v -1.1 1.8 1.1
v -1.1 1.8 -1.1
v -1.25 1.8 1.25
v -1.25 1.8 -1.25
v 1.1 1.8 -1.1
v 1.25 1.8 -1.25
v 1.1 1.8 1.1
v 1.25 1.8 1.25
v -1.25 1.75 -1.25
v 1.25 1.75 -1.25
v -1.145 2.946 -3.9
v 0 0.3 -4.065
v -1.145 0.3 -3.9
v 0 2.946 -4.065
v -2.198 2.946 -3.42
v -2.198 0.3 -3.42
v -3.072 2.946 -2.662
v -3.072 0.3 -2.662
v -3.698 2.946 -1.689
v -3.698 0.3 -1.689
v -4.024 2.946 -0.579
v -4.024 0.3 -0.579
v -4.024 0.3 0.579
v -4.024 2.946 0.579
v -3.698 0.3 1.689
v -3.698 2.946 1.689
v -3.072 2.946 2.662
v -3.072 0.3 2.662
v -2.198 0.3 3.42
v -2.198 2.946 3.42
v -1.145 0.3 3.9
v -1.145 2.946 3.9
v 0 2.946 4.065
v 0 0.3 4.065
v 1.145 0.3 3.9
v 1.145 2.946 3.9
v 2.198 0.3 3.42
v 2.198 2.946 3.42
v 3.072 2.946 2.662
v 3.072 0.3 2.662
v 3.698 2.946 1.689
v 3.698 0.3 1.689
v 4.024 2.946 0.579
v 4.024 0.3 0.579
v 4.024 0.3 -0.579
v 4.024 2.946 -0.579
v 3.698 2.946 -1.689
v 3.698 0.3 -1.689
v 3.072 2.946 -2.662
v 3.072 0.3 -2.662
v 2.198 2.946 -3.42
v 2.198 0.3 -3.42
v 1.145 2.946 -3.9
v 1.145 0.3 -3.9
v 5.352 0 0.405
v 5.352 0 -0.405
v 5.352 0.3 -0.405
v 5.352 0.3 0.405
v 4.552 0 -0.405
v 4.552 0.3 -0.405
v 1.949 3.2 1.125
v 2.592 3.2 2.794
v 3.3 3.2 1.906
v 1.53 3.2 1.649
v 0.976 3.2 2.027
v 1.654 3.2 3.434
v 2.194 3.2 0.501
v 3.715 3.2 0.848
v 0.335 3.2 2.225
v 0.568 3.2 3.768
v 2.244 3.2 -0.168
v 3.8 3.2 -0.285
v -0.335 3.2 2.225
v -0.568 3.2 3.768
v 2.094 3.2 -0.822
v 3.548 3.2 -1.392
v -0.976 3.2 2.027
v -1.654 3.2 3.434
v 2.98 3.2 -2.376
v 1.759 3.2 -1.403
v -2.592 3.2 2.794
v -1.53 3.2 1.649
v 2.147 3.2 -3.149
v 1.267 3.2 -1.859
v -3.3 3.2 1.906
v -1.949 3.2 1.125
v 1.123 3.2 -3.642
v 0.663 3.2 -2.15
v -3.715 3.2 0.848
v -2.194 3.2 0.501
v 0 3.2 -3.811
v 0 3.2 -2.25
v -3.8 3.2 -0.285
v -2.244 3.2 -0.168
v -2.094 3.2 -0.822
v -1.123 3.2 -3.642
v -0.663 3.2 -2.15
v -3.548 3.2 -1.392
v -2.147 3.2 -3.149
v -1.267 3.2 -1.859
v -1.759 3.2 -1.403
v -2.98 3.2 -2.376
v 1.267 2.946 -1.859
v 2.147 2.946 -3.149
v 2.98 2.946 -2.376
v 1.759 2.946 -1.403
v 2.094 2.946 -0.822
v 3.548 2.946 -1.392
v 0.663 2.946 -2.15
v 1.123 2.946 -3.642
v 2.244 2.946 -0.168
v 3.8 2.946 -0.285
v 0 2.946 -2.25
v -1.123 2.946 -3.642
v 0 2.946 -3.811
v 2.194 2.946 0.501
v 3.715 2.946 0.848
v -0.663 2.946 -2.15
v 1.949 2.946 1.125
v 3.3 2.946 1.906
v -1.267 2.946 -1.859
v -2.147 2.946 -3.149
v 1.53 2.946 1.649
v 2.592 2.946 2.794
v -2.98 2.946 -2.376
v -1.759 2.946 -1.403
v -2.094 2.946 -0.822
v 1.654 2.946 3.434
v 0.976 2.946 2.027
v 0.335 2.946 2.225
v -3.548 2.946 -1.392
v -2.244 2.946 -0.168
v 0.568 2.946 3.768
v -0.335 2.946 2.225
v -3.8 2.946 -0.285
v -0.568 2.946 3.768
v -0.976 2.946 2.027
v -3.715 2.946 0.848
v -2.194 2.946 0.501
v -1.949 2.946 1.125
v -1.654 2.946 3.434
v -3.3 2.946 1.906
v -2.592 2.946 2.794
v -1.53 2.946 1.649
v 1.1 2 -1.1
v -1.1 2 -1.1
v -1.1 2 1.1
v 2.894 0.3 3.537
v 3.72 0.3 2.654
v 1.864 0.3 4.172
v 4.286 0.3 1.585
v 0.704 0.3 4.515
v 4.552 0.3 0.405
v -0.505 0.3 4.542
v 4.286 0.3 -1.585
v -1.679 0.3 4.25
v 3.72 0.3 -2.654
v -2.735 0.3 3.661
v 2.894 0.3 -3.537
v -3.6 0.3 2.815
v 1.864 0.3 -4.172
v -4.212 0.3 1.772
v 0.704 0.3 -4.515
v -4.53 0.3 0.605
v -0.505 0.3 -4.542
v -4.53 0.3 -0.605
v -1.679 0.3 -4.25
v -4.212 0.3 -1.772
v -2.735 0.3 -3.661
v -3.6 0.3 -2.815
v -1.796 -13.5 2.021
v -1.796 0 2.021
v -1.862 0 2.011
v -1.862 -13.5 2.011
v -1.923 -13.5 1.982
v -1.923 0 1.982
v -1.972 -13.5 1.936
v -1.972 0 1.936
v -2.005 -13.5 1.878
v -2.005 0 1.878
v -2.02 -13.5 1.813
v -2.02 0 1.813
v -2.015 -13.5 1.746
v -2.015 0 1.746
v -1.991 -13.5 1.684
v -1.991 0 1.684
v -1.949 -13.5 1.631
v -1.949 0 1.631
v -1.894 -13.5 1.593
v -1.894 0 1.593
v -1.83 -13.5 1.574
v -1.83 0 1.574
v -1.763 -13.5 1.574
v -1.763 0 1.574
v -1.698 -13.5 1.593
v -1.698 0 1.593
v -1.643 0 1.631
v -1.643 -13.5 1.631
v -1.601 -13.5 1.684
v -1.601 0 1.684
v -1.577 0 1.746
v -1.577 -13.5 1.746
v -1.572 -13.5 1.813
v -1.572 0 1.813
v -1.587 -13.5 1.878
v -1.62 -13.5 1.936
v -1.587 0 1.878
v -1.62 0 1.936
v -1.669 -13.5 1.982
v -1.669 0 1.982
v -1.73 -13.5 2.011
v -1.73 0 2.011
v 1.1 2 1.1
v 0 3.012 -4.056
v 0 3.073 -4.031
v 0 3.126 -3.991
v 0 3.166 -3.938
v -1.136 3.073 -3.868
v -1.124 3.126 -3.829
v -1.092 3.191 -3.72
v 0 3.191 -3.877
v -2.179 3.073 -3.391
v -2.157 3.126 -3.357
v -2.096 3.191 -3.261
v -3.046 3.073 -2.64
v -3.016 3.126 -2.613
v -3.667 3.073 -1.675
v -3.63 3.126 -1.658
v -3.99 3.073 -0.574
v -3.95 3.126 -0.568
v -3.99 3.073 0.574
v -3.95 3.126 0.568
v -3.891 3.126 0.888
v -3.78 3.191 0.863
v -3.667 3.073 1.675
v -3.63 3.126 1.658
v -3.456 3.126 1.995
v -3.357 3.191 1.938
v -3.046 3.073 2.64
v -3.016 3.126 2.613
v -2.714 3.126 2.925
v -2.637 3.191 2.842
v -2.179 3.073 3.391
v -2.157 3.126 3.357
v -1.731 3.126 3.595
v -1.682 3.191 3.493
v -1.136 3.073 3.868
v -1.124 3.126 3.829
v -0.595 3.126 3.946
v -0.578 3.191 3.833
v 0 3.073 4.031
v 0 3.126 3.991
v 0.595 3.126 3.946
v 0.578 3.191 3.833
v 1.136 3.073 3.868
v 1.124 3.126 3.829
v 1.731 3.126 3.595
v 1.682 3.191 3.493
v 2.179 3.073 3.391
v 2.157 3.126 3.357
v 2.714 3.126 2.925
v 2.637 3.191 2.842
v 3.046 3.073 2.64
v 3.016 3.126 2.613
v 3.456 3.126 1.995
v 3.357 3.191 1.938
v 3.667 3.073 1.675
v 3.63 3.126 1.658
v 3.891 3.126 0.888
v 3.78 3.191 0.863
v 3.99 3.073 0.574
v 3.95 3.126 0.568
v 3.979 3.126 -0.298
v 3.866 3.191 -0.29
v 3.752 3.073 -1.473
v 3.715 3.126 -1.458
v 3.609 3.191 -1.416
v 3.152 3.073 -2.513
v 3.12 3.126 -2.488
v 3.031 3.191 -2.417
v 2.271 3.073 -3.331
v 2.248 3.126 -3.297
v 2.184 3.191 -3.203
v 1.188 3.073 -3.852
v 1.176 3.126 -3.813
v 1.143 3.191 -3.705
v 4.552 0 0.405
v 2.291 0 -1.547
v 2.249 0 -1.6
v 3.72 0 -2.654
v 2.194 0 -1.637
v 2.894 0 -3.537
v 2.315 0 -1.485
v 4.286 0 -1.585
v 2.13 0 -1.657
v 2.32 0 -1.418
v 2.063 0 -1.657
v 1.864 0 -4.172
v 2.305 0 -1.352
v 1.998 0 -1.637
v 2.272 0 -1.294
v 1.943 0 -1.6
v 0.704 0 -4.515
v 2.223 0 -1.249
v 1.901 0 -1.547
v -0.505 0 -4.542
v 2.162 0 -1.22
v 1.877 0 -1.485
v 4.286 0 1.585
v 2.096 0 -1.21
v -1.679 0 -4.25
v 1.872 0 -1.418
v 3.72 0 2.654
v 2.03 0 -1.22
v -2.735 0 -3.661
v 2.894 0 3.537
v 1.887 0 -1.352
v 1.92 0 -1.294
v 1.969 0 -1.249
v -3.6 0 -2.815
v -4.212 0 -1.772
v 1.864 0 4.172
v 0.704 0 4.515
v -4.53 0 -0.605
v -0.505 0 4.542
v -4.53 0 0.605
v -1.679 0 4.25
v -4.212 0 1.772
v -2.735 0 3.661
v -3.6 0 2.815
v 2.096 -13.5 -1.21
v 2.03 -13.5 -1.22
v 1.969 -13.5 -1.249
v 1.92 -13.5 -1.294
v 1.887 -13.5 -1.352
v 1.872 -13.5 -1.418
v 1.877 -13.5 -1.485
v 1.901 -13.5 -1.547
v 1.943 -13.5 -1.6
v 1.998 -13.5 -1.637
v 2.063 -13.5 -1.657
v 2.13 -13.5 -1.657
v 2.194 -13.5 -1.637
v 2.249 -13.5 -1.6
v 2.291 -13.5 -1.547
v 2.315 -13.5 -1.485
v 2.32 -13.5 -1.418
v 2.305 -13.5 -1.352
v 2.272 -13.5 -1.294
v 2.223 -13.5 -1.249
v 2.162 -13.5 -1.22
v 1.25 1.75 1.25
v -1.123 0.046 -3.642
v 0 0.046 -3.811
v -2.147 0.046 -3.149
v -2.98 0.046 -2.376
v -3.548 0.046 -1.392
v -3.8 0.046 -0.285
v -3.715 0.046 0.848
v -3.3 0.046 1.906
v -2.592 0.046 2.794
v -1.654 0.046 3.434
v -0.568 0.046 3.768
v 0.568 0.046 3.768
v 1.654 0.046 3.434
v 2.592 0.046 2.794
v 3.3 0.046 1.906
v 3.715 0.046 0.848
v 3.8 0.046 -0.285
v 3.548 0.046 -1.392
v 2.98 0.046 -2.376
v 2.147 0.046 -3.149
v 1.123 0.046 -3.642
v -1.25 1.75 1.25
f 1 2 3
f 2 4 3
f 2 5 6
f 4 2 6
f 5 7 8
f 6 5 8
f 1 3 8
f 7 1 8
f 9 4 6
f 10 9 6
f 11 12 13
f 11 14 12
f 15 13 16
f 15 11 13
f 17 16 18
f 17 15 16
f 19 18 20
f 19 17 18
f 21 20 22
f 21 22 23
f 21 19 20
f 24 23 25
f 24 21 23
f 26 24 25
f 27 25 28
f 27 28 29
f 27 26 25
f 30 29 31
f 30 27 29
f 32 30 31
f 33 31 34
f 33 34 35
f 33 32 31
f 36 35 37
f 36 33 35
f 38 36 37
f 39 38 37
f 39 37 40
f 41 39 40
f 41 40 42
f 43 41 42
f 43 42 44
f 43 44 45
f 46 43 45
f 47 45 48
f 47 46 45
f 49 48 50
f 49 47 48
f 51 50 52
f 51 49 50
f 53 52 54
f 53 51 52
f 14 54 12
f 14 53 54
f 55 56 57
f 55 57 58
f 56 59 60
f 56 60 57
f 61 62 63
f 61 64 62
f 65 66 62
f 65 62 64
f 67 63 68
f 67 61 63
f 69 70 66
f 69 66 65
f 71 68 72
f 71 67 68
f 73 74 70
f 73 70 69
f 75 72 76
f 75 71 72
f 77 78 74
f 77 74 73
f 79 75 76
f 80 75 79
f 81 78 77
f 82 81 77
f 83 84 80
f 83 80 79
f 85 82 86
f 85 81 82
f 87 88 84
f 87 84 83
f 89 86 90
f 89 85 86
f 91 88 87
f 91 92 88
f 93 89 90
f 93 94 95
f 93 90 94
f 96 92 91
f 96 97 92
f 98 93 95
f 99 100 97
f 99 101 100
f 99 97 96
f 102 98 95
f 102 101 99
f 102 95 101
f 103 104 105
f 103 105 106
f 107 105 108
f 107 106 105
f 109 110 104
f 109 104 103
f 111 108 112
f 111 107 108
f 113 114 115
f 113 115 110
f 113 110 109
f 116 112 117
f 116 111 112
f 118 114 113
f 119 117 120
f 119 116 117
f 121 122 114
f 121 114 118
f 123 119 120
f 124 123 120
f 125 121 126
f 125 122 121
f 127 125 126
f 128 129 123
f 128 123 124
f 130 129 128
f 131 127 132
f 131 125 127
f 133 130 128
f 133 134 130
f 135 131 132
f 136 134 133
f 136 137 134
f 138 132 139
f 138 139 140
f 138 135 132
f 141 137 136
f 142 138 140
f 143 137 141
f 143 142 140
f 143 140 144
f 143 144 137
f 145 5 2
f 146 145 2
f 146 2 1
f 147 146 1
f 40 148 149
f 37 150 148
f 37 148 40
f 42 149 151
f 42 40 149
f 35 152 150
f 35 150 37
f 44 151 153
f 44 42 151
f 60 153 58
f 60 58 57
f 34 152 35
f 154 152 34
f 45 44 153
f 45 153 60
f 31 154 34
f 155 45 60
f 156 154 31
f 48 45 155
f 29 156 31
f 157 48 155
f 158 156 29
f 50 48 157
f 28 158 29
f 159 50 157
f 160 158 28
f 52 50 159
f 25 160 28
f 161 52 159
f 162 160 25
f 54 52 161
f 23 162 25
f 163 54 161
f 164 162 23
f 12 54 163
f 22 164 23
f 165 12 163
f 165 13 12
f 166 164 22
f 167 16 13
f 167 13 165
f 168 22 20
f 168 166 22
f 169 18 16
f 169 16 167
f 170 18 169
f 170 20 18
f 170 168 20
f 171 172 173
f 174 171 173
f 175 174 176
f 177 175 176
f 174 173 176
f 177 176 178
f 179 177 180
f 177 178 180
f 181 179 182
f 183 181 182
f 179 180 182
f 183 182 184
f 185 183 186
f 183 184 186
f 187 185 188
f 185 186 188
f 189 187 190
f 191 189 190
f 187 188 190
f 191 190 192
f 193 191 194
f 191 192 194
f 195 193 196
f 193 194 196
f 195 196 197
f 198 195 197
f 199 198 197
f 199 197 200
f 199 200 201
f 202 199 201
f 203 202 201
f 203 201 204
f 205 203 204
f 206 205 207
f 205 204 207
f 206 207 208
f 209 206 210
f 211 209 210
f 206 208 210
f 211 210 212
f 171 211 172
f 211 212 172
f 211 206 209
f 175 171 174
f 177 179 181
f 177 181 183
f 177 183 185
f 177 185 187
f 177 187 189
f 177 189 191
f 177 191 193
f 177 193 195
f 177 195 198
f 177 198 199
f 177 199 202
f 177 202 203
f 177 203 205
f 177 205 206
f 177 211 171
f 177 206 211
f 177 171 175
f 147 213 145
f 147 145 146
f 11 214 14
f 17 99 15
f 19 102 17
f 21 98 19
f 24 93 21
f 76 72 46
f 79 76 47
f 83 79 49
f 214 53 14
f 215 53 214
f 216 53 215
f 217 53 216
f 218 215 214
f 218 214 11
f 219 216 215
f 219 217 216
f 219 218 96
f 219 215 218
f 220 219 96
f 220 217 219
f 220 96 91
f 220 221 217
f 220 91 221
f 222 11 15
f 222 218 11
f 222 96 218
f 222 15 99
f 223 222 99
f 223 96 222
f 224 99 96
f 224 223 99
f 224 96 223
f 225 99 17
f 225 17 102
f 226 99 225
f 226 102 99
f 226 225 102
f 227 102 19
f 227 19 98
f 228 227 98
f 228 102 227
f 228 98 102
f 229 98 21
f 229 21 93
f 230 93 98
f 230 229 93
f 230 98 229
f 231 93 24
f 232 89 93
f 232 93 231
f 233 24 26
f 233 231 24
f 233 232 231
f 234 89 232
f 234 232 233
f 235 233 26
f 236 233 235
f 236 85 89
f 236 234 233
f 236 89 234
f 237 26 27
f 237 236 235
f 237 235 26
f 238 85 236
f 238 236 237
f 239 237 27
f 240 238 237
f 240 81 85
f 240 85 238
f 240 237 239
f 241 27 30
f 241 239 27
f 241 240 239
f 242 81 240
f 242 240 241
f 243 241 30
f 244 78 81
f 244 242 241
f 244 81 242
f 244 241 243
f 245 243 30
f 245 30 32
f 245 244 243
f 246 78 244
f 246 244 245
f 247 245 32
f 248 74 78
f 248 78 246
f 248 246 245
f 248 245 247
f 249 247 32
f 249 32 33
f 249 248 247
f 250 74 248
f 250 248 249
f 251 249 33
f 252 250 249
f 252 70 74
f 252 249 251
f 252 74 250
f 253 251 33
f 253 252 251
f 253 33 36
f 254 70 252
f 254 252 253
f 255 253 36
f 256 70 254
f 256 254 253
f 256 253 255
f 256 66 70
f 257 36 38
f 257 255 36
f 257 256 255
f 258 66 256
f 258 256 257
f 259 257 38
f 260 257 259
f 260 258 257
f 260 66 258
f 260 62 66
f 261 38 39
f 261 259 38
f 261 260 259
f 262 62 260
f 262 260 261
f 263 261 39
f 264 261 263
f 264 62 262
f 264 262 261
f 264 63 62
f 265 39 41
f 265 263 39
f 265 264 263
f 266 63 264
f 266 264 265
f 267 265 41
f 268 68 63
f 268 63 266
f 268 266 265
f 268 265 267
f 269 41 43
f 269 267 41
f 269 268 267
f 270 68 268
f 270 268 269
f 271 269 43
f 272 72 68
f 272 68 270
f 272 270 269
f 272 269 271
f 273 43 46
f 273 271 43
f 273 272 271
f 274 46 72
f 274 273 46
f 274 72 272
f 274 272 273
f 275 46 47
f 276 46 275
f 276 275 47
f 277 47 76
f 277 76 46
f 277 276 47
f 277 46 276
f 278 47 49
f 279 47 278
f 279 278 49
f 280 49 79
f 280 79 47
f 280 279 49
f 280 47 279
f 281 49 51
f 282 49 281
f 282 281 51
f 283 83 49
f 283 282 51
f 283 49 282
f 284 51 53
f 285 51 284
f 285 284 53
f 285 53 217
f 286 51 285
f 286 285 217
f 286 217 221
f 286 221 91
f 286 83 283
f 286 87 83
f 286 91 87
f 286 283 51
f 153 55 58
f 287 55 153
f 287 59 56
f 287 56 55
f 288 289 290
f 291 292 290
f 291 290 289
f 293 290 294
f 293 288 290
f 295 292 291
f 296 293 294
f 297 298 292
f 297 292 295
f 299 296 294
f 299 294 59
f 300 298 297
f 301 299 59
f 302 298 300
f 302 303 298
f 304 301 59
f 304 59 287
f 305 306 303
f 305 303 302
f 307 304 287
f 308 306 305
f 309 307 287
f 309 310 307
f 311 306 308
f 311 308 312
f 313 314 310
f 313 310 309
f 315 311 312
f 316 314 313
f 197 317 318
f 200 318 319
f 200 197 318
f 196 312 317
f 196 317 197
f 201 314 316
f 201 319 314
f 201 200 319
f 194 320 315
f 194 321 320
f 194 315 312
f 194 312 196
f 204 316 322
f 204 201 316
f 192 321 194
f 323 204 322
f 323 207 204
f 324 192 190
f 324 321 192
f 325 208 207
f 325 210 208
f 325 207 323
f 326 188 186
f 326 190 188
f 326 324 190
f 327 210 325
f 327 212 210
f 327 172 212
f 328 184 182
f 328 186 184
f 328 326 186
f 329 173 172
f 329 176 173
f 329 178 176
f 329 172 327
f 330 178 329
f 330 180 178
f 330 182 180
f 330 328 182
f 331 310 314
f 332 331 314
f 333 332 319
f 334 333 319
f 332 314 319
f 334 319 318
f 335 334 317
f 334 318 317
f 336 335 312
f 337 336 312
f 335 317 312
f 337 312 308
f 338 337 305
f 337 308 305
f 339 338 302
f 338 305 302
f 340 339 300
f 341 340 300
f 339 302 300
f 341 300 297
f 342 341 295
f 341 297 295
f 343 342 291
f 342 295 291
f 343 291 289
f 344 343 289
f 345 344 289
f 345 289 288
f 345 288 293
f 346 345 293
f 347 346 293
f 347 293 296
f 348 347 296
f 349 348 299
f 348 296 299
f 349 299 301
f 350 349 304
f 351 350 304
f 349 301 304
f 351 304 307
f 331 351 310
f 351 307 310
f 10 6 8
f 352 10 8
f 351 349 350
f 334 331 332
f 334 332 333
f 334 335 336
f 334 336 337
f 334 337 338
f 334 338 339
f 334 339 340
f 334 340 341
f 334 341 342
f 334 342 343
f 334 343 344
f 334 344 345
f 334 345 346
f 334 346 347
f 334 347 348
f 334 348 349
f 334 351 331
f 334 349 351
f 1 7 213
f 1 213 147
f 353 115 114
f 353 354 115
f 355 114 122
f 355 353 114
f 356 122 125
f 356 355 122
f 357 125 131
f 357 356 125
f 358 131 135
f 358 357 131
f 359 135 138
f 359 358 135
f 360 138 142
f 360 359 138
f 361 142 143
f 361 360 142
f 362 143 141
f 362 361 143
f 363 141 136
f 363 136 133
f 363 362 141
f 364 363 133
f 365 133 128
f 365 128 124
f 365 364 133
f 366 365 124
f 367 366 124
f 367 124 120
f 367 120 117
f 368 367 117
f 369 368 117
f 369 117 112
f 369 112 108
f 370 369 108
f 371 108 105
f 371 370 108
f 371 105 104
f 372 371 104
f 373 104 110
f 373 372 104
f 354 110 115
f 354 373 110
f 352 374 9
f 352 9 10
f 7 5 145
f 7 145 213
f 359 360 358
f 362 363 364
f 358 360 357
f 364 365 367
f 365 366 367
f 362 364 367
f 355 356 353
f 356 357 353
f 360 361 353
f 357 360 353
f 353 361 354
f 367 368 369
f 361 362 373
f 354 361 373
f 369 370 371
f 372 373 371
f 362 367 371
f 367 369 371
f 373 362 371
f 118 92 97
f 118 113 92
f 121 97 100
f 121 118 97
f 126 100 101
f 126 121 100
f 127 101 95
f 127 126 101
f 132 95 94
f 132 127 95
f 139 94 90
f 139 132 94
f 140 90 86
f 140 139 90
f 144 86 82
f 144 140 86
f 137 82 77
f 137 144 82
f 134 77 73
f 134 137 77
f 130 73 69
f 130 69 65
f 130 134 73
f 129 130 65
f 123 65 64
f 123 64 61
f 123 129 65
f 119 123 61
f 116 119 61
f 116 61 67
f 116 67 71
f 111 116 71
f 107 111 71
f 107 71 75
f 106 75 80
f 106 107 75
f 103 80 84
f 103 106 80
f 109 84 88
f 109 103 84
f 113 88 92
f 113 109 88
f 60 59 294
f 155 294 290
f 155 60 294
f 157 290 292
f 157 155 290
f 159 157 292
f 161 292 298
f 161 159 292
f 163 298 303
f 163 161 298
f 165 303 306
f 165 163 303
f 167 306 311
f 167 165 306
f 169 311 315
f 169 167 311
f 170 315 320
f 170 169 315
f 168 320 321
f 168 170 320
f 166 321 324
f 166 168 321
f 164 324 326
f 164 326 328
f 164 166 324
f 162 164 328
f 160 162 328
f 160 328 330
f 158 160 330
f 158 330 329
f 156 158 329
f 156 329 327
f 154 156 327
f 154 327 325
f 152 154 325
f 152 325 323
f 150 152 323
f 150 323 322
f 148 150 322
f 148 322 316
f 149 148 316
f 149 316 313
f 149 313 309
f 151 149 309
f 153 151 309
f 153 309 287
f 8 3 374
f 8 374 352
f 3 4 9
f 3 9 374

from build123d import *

# Parameters (mm, degrees)
SKETCH2_R           = 4.57
BOSS_EXTRUDE1_DEPTH = 0.046
BOSS_EXTRUDE2_START = -1.8
SKETCH3_W           = 2.5
SKETCH3_H           = 2.5
BOSS_EXTRUDE2_DEPTH = 0.05
SKETCH8_W           = 2.2
SKETCH8_H           = 2.2
BOSS_EXTRUDE6_DEPTH = 0.2
BOSS_EXTRUDE8_DEPTH = 0.3
SKETCH5_R           = 0.225
BOSS_EXTRUDE4_DEPTH = 13.5


with BuildPart() as part:
    # Sketch1 → Revolve-Thin2 (revolve)
    with BuildSketch(Plane.XY, mode=Mode.PRIVATE) as revolve_thin2_sk:
        with BuildLine():
            Line((4.57, 0), (4.57, 0.3))
            Line((4.57, 0.3), (4.065, 0.3))
            Line((4.065, 0.3), (4.065, 2.946))
            ThreePointArc((4.065, 2.946), (3.990605122, 3.125605122), (3.811, 3.2))
            Line((3.811, 3.2), (2.25, 3.2))
            Line((2.25, 3.2), (2.25, 2.946))
            Line((2.25, 2.946), (3.811, 2.946))
            Line((3.811, 2.946), (3.811, 0.046))
            Line((3.811, 0.046), (4.316, 0.046))
            Line((4.316, 0.046), (4.316, 0))
            Line((4.316, 0), (4.57, 0))
        make_face()
    revolve(revolve_thin2_sk.sketch.rotate(Axis((0, 0, 0), (0, 1, 0)), 90), axis=Axis((0, 0, 0), (0, 1, 0)))  # turned: the seam where the file's is

    # Sketch2 → Boss-Extrude1 (add)
    with BuildSketch(Plane.XZ):
        with Locations(Location((0, 0, 0), (0, 0, 270))):  # turned: the seam where the file's is
            Circle(SKETCH2_R)
    extrude(amount=-BOSS_EXTRUDE1_DEPTH)

    # Sketch11 → Boss-Extrude8 (add)
    with BuildSketch(Plane.XZ):
        with BuildLine():
            Line((5.352018783, -0.405), (5.352018783, 0))
            Line((5.352018783, 0), (5.352018783, 0.405))
            Line((5.352018783, 0.405), (4.552018783, 0.405))
            ThreePointArc((4.552018783, 0.405), (4.565502483, 0.202699485), (4.57, 0))
            ThreePointArc((4.57, 0), (4.565502483, -0.202699485), (4.552018783, -0.405))
            Line((4.552018783, -0.405), (5.352018783, -0.405))
        make_face()
    extrude(amount=-BOSS_EXTRUDE8_DEPTH)

    # Sketch5 → Boss-Extrude4 (add)
    with BuildSketch(Plane.XZ):
        with Locations(Location((2.096051224, -1.434632101, 0), (0, 0, 90))):  # turned: the seam where the file's is
            Circle(SKETCH5_R)
        with Locations(Location((-1.796051224, 1.796051224, 0), (0, 0, 90))):  # turned: the seam where the file's is
            Circle(SKETCH5_R)
    extrude(amount=BOSS_EXTRUDE4_DEPTH)


with BuildPart() as body_2:
    # Sketch3 → Boss-Extrude2 (new body)
    with BuildSketch(Plane.XZ.offset(BOSS_EXTRUDE2_START)):
        Rectangle(SKETCH3_W, SKETCH3_H)
    extrude(amount=BOSS_EXTRUDE2_DEPTH)

    # Sketch8 → Boss-Extrude6 (add)
    with BuildSketch(Plane(origin=(0, 1.8, 0), x_dir=(-1, 0, 0), z_dir=(0, 1, 0))):
        Rectangle(SKETCH8_W, SKETCH8_H)
    extrude(amount=BOSS_EXTRUDE6_DEPTH)


solid = Compound([part.part, body_2.part])
